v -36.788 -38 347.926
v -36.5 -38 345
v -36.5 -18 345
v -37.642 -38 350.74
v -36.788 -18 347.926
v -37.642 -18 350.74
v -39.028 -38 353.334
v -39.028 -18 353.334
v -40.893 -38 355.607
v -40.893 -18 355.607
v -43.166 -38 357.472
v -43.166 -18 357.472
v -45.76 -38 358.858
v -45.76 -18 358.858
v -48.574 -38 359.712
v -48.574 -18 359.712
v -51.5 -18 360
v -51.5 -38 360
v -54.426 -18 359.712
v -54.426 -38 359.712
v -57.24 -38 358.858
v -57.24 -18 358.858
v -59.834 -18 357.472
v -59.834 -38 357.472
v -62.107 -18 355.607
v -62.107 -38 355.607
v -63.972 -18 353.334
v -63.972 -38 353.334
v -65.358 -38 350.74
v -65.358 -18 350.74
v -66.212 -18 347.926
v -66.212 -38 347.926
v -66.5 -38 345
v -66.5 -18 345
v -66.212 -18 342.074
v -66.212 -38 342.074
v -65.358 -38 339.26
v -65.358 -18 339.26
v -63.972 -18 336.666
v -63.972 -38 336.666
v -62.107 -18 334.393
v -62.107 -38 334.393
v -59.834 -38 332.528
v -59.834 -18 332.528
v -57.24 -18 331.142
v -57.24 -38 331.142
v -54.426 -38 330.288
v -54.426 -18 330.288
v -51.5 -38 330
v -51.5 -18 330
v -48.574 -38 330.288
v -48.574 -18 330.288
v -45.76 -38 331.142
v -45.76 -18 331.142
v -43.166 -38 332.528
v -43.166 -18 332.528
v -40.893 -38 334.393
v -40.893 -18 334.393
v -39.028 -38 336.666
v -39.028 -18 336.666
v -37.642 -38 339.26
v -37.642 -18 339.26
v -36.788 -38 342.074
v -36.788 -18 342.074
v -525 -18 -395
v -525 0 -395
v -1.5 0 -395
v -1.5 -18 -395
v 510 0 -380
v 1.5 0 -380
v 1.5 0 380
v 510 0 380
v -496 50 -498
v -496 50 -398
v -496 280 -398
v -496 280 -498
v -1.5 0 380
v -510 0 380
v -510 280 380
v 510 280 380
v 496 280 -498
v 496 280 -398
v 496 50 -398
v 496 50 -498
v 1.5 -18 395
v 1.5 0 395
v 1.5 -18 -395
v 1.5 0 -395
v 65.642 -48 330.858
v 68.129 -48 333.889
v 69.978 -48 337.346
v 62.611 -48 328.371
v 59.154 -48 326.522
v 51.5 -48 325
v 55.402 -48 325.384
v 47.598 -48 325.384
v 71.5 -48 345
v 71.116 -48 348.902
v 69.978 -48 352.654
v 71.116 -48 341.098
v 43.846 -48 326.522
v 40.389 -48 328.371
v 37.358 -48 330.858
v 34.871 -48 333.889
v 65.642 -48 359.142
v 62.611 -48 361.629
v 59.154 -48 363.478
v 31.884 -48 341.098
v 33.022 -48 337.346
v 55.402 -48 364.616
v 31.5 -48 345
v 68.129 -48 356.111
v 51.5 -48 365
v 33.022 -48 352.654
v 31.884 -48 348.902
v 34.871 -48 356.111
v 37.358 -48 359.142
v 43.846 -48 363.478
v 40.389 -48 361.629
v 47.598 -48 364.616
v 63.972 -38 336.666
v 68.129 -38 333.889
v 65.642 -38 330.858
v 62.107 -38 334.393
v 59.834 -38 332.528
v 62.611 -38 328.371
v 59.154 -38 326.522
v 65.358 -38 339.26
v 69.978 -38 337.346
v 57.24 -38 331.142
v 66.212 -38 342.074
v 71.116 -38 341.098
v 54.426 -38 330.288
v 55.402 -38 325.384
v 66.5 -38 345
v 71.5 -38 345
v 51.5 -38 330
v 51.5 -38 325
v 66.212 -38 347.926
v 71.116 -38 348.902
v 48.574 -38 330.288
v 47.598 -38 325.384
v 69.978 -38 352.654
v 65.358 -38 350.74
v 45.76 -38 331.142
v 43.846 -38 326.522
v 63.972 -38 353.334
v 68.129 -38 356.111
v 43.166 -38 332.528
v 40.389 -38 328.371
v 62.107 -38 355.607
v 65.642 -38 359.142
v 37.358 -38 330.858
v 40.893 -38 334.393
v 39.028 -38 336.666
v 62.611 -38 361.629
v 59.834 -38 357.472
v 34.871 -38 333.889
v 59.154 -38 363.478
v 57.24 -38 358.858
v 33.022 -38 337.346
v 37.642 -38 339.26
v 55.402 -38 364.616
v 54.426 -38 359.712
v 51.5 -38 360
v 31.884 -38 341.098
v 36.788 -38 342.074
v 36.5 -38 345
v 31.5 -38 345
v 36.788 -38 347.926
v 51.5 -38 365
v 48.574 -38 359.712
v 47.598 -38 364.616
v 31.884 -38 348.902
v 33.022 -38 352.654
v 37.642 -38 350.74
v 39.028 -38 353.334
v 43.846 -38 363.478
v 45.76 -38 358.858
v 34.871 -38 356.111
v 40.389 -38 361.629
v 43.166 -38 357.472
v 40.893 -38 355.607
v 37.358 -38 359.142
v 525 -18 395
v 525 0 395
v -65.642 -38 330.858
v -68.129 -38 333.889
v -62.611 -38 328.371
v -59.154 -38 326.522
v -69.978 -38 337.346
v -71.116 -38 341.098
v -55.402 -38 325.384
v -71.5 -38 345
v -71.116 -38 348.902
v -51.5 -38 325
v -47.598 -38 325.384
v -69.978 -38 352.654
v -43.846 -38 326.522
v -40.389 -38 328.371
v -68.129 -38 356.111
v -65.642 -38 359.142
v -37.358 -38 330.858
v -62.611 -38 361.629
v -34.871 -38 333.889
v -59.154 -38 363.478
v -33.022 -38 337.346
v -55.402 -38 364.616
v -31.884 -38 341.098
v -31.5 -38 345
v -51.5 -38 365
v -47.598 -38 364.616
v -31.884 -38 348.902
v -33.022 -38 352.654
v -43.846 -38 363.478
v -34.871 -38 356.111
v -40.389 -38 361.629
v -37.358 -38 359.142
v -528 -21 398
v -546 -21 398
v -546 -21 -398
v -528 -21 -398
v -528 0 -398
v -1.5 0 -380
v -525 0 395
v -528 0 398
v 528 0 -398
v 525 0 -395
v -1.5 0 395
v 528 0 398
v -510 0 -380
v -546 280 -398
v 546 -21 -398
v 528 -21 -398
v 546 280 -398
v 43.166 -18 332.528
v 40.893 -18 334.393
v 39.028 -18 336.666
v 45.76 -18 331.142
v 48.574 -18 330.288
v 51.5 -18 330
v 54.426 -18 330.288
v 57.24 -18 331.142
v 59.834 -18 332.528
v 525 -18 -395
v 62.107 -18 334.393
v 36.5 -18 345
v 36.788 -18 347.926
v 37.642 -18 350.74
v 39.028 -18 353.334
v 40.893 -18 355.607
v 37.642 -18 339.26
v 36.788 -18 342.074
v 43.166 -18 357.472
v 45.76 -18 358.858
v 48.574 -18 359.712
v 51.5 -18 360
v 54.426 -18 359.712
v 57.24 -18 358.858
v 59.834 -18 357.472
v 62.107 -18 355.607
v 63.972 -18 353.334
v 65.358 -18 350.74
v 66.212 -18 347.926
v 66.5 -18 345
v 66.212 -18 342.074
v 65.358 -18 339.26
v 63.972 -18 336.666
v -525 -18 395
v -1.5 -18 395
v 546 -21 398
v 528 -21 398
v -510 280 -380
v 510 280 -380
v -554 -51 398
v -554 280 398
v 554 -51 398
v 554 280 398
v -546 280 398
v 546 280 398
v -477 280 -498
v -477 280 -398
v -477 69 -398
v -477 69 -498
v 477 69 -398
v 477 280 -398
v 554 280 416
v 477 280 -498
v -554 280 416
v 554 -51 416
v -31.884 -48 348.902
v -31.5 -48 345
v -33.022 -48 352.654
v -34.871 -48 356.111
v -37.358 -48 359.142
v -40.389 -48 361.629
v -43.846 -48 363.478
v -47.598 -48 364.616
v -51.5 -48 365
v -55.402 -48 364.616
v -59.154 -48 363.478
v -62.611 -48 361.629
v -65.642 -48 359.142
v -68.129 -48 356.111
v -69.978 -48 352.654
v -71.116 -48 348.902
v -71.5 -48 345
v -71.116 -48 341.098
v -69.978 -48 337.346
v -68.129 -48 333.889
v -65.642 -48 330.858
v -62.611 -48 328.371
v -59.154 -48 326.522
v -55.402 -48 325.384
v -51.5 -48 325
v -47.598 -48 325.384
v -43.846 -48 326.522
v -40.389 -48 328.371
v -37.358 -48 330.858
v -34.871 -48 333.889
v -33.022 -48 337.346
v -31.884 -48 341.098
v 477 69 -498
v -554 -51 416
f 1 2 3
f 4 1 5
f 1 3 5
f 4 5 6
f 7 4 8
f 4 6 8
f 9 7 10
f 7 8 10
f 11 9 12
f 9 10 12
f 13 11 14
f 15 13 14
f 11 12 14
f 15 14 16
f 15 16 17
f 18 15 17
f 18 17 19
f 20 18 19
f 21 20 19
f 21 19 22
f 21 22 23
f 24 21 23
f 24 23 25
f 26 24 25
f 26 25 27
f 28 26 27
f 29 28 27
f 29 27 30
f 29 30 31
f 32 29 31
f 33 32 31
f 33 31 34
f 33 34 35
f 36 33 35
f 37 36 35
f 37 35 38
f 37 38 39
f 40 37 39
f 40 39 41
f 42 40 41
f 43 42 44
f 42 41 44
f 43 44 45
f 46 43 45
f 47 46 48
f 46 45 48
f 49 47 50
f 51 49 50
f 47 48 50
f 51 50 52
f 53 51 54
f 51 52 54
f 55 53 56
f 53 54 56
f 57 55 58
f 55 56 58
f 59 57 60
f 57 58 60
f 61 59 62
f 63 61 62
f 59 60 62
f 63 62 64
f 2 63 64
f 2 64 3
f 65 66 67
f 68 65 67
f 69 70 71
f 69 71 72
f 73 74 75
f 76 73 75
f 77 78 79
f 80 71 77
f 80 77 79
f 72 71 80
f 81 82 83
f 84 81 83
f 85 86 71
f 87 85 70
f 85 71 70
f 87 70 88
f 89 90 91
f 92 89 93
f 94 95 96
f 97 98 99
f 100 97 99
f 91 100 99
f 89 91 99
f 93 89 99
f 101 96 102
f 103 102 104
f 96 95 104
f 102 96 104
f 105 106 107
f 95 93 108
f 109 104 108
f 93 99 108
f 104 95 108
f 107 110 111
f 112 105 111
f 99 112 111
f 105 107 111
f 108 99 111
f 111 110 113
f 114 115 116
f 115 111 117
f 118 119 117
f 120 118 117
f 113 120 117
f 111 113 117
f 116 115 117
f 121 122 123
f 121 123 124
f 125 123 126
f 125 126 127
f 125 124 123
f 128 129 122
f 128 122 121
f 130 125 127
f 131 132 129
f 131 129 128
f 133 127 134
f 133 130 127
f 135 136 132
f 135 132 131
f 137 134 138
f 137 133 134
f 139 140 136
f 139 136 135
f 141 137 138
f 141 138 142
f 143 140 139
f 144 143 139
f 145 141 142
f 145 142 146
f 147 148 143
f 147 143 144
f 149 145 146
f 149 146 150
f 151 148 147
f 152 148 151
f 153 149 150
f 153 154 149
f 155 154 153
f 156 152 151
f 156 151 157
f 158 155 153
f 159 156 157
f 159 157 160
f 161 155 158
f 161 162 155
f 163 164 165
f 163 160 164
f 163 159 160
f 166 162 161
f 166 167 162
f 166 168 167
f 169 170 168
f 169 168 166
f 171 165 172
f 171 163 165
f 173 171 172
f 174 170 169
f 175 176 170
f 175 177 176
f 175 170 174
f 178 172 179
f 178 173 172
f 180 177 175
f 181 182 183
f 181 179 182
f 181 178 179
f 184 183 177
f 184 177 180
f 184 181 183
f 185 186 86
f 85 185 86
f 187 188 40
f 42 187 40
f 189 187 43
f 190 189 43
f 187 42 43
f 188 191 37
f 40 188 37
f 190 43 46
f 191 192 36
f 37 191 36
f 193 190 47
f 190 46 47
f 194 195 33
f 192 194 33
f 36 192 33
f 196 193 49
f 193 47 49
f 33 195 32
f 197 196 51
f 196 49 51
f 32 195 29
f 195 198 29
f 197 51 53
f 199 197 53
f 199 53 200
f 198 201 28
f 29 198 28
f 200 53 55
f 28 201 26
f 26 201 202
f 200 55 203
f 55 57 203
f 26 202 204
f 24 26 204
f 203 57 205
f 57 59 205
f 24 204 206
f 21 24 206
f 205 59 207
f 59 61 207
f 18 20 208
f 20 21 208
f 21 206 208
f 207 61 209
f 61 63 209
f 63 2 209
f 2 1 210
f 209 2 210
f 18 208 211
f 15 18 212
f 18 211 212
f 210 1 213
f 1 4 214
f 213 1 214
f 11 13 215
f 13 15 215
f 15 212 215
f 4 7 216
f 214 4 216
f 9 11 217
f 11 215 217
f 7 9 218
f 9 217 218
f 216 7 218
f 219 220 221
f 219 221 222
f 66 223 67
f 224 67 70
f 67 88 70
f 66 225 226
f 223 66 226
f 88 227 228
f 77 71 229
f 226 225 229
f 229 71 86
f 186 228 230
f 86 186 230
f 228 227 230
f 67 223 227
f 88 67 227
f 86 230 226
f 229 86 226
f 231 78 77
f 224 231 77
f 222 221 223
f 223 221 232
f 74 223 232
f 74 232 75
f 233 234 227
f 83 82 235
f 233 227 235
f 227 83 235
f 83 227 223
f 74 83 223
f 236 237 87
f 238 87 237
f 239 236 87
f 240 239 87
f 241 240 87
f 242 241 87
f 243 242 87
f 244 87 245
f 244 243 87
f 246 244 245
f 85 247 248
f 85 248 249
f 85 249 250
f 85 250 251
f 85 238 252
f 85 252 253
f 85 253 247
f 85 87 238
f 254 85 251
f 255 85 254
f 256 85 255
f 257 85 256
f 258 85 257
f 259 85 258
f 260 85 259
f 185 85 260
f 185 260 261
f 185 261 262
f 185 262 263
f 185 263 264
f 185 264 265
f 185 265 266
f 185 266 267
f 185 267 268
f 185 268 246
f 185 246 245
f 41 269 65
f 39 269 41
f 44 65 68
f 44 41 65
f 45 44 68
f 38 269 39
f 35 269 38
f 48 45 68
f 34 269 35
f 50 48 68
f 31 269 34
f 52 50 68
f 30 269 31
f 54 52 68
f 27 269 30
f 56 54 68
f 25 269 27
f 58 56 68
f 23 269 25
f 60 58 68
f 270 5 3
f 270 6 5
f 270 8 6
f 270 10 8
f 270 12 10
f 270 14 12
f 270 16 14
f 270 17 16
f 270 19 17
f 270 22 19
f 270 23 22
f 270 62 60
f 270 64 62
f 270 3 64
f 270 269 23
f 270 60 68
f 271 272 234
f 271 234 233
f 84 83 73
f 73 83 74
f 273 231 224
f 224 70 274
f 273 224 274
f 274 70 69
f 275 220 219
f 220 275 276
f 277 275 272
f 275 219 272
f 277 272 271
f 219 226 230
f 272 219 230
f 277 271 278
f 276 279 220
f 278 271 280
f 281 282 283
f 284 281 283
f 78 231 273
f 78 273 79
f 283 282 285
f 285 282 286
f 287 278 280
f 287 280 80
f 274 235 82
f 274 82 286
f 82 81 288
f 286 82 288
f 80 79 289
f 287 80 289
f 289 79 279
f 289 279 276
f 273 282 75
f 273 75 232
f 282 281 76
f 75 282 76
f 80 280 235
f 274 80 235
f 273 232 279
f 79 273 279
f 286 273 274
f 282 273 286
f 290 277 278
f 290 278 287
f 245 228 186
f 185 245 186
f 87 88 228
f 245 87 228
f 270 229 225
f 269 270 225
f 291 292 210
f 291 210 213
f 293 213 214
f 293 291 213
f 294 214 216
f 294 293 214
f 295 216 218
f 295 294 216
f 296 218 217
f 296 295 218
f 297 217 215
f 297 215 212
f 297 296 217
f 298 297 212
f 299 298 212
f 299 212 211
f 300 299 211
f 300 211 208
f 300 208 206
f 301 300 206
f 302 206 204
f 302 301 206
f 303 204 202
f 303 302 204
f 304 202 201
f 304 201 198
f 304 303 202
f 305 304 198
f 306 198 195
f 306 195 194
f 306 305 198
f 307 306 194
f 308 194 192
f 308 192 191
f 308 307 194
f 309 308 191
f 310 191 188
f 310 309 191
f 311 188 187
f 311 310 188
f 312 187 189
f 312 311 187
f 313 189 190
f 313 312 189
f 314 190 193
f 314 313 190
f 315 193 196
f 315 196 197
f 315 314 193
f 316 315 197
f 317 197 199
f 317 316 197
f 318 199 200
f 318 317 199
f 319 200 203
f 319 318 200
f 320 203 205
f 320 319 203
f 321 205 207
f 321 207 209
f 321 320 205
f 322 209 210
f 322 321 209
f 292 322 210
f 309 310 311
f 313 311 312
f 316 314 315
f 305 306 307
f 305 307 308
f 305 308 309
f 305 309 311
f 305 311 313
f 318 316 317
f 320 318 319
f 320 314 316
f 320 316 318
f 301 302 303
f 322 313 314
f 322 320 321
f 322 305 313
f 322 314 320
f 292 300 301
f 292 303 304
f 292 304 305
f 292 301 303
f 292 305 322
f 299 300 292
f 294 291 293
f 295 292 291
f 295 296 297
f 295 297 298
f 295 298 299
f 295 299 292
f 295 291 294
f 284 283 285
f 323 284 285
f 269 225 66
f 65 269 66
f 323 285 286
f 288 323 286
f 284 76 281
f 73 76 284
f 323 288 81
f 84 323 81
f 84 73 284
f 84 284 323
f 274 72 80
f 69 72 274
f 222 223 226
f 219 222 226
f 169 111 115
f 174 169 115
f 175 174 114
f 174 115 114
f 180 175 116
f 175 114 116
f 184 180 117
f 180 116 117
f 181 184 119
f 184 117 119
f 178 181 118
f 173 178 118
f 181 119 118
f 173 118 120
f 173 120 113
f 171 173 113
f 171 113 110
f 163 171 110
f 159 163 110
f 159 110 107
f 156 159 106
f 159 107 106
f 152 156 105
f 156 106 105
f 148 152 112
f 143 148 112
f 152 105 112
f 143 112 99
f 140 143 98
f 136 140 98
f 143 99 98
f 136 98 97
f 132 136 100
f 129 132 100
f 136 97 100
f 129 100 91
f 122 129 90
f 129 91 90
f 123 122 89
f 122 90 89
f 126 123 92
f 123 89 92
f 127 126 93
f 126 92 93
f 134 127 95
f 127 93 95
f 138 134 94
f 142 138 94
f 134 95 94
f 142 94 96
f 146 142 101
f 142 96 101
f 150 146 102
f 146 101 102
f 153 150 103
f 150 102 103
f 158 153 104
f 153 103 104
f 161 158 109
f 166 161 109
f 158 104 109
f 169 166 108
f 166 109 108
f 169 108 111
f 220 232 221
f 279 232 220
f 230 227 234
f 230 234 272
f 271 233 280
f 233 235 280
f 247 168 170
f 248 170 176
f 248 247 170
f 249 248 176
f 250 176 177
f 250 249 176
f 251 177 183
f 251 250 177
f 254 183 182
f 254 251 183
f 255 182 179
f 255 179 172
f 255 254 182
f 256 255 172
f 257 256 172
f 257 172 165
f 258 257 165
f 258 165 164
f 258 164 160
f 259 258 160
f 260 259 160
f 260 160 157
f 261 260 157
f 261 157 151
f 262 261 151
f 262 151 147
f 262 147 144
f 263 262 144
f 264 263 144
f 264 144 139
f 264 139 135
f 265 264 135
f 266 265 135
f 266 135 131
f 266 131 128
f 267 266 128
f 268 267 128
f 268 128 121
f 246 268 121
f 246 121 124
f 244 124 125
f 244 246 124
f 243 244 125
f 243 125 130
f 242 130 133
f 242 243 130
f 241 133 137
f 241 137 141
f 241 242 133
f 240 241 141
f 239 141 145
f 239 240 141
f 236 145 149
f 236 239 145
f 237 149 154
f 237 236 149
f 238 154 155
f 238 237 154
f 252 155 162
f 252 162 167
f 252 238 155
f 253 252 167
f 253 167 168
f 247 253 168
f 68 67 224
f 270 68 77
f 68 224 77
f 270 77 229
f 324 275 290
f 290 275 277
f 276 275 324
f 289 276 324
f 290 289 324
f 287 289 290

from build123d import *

# Parameters (mm, degrees)
F0_W      = 1020
F0_H      = 17.9999992251
F1_DEPTH  = 280
F2_DEPTH  = 280
F3_W      = 280
F3_H      = 795.9999984503
F4_DEPTH  = 18
F5_W      = 280
F5_H      = 795.9999984503
F6_DEPTH  = 18
F7_W      = 1091.9999984503
F7_H      = 280
F8_DEPTH  = 18
F9_W      = 18
F9_H      = 795.9999984503
F10_DEPTH = 21
F11_DEPTH = 21
F12_DEPTH = 21
F14_DEPTH = 100
F15_W     = 508.5
F15_H     = 760
F16_DEPTH = 18
F17_DEPTH = 18
F18_R     = 15
F19_DEPTH = 30
F20_R     = 20
F20_R_2   = 15
F21_DEPTH = 10


with BuildPart() as f1:
    # F0 (on Front) → F1 (new body)
    with BuildSketch(Plane.XZ):
        with Locations((0, 388.9999996126)):
            Rectangle(F0_W, F0_H)
    extrude(amount=-F1_DEPTH)

    # F0 (on Front) → F2 (join)
    with BuildSketch(Plane.XZ):
        Polygon((510, -397.9999992251), (527.9999992251, -397.9999992251), (527.9999992251, 397.9999992251), (510, 397.9999992251), (510, 380), (510, -380), align=None)
        with Locations((0, -388.9999996126)):
            Rectangle(F0_W, F0_H)
        Polygon((-527.9999992251, -397.9999992251), (-510, -397.9999992251), (-510, -380), (-510, 380), (-510, 397.9999992251), (-527.9999992251, 397.9999992251), align=None)
        with Locations((0, 388.9999996126)):
            Rectangle(F0_W, F0_H)
    extrude(amount=-F2_DEPTH)

    # F3 (on face) → F4 (join)
    with BuildSketch(Plane.YZ.offset(527.9999992251)):
        with Locations((140, 0)):
            Rectangle(F3_W, F3_H)
    extrude(amount=F4_DEPTH)

    # F5 (on face) → F6 (join)
    with BuildSketch(Plane(origin=(-527.9999992251, 0, 0), x_dir=(0, -1, 0), z_dir=(-1, 0, 0))):
        with Locations((-140, 0)):
            Rectangle(F5_W, F5_H)
    extrude(amount=F6_DEPTH)

    # F7 (on face) → F8 (join)
    with BuildSketch(Plane.XY.offset(397.9999992251)):
        with Locations((0, 140)):
            Rectangle(F7_W, F7_H)
        Polygon((553.9999992251, 280), (545.9999992251, 280), (545.9999992251, 0), (-545.9999992251, 0), (-545.9999992251, -30), (553.9999992251, -30), align=None)
    extrude(amount=F8_DEPTH)

    # F9 (on face) → F10 (join)
    with BuildSketch(Plane.XZ):
        with Locations((-536.9999992251, 0)):
            Rectangle(F9_W, F9_H)
    extrude(amount=F10_DEPTH)

    # F9 (on face) → F11 (join)
    with BuildSketch(Plane.XZ):
        with Locations((536.9999992251, 0)):
            Rectangle(F9_W, F9_H)
    extrude(amount=F11_DEPTH)

    # F12 (add): a face of the model
    f12_faces = [f1.faces().sort_by_distance(p)[0] for p in [
        (4, -30, 406.9999992251),
    ]]
    extrude(f12_faces, amount=F12_DEPTH)

    # F13 (on face) → F14 (join)
    with BuildSketch(Plane(origin=(0, 0, -397.9999992251), x_dir=(1, 0, 0), z_dir=(0, 0, -1))):
        Polygon((-495.9999992251, -50), (-495.9999992251, -280), (-476.9999992251, -280), (-476.9999992251, -69), (476.9999992251, -69), (476.9999992251, -280), (495.9999992251, -280), (495.9999992251, -50), align=None)
    extrude(amount=F14_DEPTH)

    # F15 (on face) → F16 (join)
    with BuildSketch(Plane.XZ):
        Polygon((-1.5, 380), (-1.5, 394.9999992251), (-524.9999992251, 394.9999992251), (-524.9999992251, -394.9999992251), (-1.5, -394.9999992251), (-1.5, -380), (-510, -380), (-510, 380), align=None)
        with Locations((-255.75, 0)):
            Rectangle(F15_W, F15_H)
    extrude(amount=F16_DEPTH)

    # F15 (on face) → F17 (join)
    with BuildSketch(Plane.XZ):
        Polygon((524.9999992251, -394.9999992251), (524.9999992251, 394.9999992251), (1.5, 394.9999992251), (1.5, 380), (510, 380), (510, -380), (1.5, -380), (1.5, -394.9999992251), align=None)
        with Locations((255.75, 0)):
            Rectangle(F15_W, F15_H)
    extrude(amount=F17_DEPTH)

    # F18 (on face) → F19 (join)
    with BuildSketch(Plane.XZ.offset(18)):
        with Locations((-51.5, 344.9999992251)):
            Circle(F18_R)
    extrude(amount=F19_DEPTH)

    # F20 (on face) → F21 (join)
    with BuildSketch(Plane.XZ.offset(48)):
        with Locations((-51.5, 344.9999992251)):
            Circle(F20_R)
        with Locations((-51.5, 344.9999992251)):
            Circle(F20_R_2, mode=Mode.SUBTRACT)
    extrude(amount=-F21_DEPTH)

    # F22: F1 across plane


with BuildPart() as f1_1:
    add(f1.part)
    add(f1.part.mirror(Plane.YZ))


solid = f1_1.part
